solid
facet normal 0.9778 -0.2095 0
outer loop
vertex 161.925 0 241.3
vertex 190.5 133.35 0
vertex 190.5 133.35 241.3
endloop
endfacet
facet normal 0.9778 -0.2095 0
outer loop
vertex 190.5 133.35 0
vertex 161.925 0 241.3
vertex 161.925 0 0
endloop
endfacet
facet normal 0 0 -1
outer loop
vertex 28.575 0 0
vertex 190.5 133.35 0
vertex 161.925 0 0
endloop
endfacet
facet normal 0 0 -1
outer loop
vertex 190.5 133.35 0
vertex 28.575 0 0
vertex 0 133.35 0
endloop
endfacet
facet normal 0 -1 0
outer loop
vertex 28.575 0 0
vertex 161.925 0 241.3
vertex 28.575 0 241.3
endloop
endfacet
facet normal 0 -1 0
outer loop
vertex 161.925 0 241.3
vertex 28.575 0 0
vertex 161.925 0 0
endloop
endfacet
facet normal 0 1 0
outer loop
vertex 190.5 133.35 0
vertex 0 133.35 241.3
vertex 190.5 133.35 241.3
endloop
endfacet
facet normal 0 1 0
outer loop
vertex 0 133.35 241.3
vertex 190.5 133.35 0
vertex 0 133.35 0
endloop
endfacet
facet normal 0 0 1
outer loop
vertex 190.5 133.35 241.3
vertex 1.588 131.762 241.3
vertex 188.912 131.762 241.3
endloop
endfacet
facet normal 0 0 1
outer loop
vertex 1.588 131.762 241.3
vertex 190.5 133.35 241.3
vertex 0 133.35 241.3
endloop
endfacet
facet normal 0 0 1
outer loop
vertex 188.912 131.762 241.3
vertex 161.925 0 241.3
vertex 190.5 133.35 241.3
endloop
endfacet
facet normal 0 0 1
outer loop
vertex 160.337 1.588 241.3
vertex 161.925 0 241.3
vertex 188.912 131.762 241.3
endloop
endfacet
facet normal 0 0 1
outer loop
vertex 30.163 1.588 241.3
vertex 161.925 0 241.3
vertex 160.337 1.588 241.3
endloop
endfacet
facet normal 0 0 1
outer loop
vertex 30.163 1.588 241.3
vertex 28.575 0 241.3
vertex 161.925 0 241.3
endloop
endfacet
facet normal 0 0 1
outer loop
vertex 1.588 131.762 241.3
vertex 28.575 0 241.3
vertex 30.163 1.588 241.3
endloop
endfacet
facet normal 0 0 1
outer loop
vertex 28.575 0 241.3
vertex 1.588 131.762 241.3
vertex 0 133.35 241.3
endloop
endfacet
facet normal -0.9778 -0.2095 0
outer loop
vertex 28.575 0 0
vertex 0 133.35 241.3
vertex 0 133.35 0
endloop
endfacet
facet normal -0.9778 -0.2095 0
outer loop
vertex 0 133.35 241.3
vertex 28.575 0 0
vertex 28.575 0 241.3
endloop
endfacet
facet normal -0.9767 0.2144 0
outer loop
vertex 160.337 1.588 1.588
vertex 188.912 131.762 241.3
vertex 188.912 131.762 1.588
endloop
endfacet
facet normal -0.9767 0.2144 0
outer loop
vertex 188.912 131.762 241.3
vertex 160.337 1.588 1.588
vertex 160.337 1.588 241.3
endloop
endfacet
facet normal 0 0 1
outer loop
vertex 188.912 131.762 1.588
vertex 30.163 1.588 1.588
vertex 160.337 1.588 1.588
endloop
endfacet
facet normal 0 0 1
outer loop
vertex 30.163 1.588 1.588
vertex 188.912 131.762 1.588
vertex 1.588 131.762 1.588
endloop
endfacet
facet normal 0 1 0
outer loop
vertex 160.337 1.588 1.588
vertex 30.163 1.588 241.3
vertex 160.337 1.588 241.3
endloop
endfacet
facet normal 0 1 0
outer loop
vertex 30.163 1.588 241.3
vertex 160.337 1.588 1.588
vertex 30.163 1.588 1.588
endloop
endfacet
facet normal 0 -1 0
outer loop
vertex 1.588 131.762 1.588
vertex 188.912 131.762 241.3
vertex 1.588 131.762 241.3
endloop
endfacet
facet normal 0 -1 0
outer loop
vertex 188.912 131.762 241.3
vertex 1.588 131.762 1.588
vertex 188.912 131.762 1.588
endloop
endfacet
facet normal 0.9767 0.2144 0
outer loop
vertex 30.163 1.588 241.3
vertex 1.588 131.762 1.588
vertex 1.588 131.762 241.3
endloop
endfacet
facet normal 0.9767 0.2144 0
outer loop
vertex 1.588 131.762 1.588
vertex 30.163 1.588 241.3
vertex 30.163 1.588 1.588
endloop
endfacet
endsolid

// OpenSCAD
/* [Model Resolution (All Measurments are in metric)] */
$fn = 256;

wall_thickness = 1.588;

/* [Outer Dimensions] */
start_x = 28.575;
start_y = 0.00;
top_left_x = 0.00;
top_left_y = 133.35;
top_right_x = 190.5;
top_right_y = 133.35;
slope_bottom_x = 60.00;
slope_bottom_y = 5.0;
bottom_right_x = 161.925;
bottom_right_y = 0.00;

difference(){
linear_extrude(241.3){
    polygon(points=[
[start_x,start_y],
[top_left_x,top_left_y],
[top_right_x,top_right_y],
//[slope_bottom_x,slope_bottom_y],
[bottom_right_x,bottom_right_y],
]
    );
}

translate([0,0,wall_thickness])
linear_extrude(261.3){
    polygon(points=[
[start_x+wall_thickness,start_y+wall_thickness],
[top_left_x+wall_thickness,top_left_y-wall_thickness],
[top_right_x-wall_thickness,top_right_y-wall_thickness],
//[slope_bottom_x,slope_bottom_y],
[bottom_right_x-wall_thickness,bottom_right_y+wall_thickness],
]
    );
}
}
